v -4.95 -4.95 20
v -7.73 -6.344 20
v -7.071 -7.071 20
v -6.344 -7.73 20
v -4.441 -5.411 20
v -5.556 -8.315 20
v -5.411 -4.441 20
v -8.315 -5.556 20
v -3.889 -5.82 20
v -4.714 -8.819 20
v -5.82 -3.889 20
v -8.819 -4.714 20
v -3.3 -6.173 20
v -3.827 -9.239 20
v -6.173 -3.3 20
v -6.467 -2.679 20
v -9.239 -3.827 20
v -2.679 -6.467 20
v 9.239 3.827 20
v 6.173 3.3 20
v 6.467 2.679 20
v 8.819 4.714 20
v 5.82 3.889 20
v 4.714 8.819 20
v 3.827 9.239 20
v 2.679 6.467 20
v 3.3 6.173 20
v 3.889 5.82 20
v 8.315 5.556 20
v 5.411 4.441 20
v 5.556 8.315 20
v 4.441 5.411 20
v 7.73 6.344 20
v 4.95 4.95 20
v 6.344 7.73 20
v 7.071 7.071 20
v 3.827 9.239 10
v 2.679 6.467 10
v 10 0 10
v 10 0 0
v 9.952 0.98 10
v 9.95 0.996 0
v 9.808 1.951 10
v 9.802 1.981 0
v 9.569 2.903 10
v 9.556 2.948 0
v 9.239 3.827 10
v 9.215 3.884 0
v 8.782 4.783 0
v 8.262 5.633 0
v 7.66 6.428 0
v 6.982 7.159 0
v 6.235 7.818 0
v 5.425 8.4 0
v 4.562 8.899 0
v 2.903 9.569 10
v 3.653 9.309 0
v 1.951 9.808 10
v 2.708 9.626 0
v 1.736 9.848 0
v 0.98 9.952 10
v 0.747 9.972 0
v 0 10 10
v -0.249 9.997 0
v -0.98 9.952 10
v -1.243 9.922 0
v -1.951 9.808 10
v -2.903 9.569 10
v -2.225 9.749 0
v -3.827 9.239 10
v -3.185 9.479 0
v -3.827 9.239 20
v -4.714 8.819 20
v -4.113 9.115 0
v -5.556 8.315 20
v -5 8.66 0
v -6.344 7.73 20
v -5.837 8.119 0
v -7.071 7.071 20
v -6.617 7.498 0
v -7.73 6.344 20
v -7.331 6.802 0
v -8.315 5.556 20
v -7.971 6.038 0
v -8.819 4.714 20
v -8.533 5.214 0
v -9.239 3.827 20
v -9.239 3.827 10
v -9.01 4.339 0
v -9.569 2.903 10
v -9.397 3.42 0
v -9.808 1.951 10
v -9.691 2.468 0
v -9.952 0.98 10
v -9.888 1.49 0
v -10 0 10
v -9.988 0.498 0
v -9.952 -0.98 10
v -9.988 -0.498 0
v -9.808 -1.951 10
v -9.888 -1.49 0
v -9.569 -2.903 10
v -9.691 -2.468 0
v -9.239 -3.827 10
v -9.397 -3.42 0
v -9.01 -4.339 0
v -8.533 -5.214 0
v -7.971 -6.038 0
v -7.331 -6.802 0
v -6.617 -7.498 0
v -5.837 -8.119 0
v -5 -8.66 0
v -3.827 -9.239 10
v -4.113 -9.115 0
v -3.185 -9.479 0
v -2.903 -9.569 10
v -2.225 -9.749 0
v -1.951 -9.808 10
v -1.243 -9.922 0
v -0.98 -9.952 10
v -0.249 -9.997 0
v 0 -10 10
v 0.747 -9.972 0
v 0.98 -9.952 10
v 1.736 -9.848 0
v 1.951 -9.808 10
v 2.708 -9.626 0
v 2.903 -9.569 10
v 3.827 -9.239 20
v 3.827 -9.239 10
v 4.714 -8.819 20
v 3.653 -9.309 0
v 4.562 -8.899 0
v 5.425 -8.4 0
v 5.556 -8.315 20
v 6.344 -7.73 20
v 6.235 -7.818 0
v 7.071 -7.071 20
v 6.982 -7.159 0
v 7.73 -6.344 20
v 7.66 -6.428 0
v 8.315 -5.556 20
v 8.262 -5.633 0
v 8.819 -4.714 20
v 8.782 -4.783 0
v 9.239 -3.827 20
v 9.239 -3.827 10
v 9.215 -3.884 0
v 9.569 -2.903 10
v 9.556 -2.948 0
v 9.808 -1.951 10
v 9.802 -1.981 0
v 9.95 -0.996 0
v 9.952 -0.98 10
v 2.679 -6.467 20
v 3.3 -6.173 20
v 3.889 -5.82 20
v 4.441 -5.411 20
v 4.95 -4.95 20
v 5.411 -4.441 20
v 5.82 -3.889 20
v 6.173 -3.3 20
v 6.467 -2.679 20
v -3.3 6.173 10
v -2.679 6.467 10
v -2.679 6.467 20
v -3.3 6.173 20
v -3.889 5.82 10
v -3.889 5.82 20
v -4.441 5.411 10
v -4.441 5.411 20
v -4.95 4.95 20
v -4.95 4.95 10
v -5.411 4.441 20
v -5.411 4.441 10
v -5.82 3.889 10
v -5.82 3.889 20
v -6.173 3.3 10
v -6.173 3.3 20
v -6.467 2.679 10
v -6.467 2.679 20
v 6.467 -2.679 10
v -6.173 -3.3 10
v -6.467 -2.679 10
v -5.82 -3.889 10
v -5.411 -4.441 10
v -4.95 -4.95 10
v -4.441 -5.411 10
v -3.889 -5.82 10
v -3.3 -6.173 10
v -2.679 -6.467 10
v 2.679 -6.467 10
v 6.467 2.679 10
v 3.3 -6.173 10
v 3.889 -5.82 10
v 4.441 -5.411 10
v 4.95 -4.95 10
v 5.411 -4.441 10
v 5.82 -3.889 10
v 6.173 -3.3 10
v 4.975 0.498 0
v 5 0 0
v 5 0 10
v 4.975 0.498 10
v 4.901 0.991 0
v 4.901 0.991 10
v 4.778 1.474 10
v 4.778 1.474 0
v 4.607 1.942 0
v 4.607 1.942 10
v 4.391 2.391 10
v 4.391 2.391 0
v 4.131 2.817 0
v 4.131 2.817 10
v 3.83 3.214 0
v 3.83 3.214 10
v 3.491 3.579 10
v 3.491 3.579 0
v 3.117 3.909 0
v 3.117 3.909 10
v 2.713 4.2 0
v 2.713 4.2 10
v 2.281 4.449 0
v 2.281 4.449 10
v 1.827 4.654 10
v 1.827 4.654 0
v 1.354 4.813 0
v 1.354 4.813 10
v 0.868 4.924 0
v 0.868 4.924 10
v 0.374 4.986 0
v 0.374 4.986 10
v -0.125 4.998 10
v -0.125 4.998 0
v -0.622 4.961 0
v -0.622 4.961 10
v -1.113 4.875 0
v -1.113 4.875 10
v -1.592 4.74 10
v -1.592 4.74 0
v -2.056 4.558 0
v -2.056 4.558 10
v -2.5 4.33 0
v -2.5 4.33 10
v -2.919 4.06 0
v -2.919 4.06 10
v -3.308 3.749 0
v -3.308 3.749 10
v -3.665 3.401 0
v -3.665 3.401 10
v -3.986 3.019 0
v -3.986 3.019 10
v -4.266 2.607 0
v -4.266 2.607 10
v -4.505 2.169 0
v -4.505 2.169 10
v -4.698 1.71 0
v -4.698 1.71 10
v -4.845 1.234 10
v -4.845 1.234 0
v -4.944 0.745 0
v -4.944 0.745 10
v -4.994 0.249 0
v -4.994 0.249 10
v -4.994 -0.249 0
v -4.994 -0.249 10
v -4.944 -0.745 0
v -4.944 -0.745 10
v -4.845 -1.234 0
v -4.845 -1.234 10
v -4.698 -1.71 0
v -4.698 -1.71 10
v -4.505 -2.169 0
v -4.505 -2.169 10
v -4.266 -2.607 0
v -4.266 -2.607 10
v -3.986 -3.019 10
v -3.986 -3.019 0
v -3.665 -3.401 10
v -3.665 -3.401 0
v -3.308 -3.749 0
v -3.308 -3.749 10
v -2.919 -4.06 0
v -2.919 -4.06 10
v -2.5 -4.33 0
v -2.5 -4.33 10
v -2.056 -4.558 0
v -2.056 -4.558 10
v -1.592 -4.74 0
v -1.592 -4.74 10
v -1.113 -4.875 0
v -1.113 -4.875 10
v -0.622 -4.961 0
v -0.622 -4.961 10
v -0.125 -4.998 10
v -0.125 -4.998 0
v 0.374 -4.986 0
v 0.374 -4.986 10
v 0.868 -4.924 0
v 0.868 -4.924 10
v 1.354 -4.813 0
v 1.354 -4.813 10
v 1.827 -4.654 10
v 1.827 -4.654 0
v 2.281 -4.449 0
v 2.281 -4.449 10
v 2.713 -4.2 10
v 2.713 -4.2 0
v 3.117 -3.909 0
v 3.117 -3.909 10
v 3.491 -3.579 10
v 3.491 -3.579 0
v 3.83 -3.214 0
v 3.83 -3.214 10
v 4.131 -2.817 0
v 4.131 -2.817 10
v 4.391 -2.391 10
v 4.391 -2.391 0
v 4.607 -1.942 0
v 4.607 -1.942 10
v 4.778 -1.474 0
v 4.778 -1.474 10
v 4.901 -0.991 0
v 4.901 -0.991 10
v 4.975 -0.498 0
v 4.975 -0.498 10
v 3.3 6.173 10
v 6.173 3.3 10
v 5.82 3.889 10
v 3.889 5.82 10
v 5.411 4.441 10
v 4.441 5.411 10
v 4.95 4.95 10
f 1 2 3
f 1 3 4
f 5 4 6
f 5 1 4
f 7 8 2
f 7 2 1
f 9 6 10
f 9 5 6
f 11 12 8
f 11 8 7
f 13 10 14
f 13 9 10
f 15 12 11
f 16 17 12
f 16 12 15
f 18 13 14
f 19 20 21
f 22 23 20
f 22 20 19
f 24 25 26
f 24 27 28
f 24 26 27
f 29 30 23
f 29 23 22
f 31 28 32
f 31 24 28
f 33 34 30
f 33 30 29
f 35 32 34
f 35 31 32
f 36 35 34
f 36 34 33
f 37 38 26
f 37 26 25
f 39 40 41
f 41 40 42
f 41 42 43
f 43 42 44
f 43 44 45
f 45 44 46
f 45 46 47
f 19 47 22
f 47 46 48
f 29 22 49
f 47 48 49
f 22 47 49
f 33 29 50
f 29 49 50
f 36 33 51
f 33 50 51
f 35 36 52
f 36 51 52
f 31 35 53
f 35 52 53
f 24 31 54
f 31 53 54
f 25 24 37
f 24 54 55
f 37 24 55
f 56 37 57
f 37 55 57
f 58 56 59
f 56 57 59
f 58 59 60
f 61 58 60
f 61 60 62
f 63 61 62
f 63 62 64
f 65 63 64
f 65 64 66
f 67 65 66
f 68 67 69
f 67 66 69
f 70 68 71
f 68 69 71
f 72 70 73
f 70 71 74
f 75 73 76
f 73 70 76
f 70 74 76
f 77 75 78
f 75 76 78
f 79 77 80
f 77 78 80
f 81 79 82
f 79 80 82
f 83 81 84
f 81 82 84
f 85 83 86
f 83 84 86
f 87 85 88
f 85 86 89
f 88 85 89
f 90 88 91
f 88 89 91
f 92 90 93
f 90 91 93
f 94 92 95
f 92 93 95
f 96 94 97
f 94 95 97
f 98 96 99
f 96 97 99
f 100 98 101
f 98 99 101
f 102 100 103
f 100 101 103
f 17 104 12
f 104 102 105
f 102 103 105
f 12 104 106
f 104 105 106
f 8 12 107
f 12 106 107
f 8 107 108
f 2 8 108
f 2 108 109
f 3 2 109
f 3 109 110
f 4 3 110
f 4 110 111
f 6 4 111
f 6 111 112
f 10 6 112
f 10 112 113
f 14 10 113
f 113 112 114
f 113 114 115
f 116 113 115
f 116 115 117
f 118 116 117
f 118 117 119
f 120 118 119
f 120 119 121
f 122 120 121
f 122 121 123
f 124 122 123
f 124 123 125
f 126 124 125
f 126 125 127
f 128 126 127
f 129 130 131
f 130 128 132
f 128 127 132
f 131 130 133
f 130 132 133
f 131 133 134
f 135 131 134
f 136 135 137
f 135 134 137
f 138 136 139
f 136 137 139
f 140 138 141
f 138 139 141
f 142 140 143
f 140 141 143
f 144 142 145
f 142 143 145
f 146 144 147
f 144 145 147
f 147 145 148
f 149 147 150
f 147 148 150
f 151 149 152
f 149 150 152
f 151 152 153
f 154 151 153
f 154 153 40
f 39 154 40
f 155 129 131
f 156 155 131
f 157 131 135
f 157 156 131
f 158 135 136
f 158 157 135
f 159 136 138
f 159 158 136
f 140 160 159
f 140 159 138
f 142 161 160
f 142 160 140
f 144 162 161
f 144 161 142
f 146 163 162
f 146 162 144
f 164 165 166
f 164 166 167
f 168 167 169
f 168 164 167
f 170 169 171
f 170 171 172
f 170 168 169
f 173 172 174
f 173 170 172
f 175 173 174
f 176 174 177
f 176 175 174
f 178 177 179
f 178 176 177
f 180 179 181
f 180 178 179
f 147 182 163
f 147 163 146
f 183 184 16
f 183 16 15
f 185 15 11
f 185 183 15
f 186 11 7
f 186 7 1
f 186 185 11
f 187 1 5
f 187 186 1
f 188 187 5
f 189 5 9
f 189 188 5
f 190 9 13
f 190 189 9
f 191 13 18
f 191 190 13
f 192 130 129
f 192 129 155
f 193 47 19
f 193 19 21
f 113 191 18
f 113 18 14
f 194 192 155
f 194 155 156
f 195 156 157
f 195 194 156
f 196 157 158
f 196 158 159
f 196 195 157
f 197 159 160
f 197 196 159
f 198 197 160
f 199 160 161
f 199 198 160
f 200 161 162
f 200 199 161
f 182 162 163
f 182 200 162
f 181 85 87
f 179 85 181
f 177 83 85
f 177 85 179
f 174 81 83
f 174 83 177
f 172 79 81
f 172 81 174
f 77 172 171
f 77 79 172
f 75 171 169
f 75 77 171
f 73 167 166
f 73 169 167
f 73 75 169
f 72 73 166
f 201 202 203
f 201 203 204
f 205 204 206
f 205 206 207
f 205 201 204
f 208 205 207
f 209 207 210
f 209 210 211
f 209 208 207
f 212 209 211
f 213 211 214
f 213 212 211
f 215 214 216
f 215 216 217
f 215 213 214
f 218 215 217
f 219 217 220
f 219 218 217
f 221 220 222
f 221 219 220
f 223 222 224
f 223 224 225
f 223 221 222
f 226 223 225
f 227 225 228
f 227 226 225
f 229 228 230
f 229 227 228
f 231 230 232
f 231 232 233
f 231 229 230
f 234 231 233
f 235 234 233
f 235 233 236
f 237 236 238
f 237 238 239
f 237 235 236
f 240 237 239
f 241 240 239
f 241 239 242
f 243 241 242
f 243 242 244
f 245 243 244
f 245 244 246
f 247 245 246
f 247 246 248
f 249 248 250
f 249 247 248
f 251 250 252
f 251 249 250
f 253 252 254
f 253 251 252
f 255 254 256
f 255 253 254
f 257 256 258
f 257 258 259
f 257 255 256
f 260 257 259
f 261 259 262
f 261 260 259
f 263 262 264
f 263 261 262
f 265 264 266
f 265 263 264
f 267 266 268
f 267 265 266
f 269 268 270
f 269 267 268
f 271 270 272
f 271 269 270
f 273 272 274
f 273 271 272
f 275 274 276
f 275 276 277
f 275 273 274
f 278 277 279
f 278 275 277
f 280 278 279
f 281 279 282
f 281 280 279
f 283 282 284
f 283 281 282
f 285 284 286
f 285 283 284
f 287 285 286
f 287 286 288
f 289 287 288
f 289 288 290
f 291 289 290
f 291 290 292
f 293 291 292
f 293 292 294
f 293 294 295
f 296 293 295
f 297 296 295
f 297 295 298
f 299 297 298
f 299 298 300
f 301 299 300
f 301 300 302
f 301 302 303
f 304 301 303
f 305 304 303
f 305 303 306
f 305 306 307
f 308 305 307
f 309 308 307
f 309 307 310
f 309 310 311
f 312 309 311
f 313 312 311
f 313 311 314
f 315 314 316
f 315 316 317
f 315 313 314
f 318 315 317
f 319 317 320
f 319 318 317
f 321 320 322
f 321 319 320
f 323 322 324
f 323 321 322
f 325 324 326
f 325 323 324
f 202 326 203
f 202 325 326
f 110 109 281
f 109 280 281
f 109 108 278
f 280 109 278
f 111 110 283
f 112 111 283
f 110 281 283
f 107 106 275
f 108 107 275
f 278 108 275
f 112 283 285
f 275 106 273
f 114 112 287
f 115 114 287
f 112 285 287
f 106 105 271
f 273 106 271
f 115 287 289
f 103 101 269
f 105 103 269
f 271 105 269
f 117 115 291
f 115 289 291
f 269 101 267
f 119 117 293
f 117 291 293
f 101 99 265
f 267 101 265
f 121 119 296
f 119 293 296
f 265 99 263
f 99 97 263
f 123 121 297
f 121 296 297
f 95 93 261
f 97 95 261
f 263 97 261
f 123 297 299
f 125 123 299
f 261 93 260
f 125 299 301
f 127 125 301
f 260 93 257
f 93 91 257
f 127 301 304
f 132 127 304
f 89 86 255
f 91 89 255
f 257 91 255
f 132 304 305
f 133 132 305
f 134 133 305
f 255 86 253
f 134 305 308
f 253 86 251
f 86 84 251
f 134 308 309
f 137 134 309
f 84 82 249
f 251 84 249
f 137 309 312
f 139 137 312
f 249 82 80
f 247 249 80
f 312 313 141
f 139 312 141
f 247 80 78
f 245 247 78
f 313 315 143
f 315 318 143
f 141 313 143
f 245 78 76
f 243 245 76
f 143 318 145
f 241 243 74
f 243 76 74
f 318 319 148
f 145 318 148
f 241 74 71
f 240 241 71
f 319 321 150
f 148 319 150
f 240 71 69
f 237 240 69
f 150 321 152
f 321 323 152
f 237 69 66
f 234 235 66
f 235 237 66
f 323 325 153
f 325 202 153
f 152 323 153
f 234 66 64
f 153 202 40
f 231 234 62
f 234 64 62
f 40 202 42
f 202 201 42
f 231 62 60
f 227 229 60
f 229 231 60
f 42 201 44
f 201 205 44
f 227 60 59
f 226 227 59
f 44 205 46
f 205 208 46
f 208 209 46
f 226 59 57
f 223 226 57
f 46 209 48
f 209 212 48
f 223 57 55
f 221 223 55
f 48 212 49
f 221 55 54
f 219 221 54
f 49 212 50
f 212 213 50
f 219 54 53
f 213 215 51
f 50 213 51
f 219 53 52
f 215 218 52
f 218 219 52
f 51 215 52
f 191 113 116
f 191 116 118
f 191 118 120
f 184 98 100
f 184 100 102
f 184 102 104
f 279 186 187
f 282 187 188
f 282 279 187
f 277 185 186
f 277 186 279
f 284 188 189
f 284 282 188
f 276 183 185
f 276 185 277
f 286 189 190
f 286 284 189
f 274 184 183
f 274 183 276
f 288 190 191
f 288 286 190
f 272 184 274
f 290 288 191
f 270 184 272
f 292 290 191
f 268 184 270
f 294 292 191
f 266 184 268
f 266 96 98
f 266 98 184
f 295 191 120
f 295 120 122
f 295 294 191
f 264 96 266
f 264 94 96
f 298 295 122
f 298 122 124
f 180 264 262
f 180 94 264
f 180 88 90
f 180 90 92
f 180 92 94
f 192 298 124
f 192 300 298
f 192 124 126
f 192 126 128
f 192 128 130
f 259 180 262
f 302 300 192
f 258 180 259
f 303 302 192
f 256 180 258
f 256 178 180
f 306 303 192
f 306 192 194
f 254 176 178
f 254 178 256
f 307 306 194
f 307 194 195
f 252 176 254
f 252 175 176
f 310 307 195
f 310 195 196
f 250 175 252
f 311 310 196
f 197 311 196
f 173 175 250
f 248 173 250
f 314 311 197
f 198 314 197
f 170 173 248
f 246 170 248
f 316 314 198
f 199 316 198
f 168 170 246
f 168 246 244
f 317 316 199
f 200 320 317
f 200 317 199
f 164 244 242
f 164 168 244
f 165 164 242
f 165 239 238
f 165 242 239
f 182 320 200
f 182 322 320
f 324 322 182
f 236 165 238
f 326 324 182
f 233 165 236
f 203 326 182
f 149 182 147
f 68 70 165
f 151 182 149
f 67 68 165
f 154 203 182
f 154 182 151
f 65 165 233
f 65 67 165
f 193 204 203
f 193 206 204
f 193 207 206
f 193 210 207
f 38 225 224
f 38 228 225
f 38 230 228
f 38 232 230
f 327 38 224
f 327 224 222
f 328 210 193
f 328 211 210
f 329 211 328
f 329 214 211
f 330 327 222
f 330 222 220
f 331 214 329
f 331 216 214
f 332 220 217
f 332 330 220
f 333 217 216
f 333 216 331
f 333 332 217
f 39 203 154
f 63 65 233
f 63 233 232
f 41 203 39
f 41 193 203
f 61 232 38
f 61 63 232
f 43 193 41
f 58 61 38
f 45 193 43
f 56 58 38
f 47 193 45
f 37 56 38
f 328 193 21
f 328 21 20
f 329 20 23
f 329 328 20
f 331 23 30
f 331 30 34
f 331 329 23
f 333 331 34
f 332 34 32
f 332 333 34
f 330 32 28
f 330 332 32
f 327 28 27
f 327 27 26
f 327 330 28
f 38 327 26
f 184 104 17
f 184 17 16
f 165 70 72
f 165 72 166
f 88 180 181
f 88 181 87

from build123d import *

# Parameters (mm, degrees)
SKETCH_1_R          = 10
SKETCH_1_R_2        = 5
EXTRUDE_1_DEPTH     = 10
SKETCH_2_R          = 10
SKETCH_2_R_2        = 4
EXTRUDE_2_DEPTH     = 10
CUT_EXTRUDE_START   = -10
CUT_EXTRUDE_1_DEPTH = 10
SKETCH_4_R          = 7
CUT_EXTRUDE_2_DEPTH = 10


with BuildPart() as part:
    # 草图1 → 凸台-拉伸1 (new body)
    with BuildSketch(Plane.XY):
        Circle(SKETCH_1_R)
        Circle(SKETCH_1_R_2, mode=Mode.SUBTRACT)
    extrude(amount=EXTRUDE_1_DEPTH)

    # 草图2 → 凸台-拉伸2 (add)
    with BuildSketch(Plane.XY.offset(10)):
        Circle(SKETCH_2_R)
        Circle(SKETCH_2_R_2, mode=Mode.SUBTRACT)
    extrude(amount=EXTRUDE_2_DEPTH)

    # 草图3 → 切除-拉伸1 (cut)
    with BuildSketch(Plane.XY.offset(20).offset(CUT_EXTRUDE_START)):
        with BuildLine():
            Line((2.678784027, 6.467156728), (3.826834324, 9.238795325))
            ThreePointArc((3.826834324, 9.238795325), (0, 10), (-3.826834324, 9.238795325))
            Line((-3.826834324, 9.238795325), (-2.678784027, 6.467156728))
            ThreePointArc((-2.678784027, 6.467156728), (0, 7), (2.678784027, 6.467156728))
        make_face()
        with BuildLine():
            ThreePointArc((10, 0), (9.807852804, 1.95090322), (9.238795325, 3.826834324))
            Line((9.238795325, 3.826834324), (6.467156728, 2.678784027))
            ThreePointArc((6.467156728, 2.678784027), (7, 0), (6.467156728, -2.678784027))
            Line((6.467156728, -2.678784027), (9.238795325, -3.826834324))
            ThreePointArc((9.238795325, -3.826834324), (9.807852804, -1.95090322), (10, 0))
        make_face()
        with BuildLine():
            Line((-2.678784027, -6.467156728), (-3.826834324, -9.238795325))
            ThreePointArc((-3.826834324, -9.238795325), (0, -10), (3.826834324, -9.238795325))
            Line((3.826834324, -9.238795325), (2.678784027, -6.467156728))
            ThreePointArc((2.678784027, -6.467156728), (0, -7), (-2.678784027, -6.467156728))
        make_face()
        with BuildLine():
            Line((-6.467156728, 2.678784027), (-9.238795325, 3.826834324))
            ThreePointArc((-9.238795325, 3.826834324), (-10, 0), (-9.238795325, -3.826834324))
            Line((-9.238795325, -3.826834324), (-6.467156728, -2.678784027))
            ThreePointArc((-6.467156728, -2.678784027), (-7, 0), (-6.467156728, 2.678784027))
        make_face()
    extrude(amount=CUT_EXTRUDE_1_DEPTH, mode=Mode.SUBTRACT)

    # 草图4 → 切除-拉伸2 (cut)
    with BuildSketch(Plane.XY.offset(20).offset(CUT_EXTRUDE_START)):
        Circle(SKETCH_4_R)
    extrude(amount=CUT_EXTRUDE_2_DEPTH, mode=Mode.SUBTRACT)


solid = part.part
